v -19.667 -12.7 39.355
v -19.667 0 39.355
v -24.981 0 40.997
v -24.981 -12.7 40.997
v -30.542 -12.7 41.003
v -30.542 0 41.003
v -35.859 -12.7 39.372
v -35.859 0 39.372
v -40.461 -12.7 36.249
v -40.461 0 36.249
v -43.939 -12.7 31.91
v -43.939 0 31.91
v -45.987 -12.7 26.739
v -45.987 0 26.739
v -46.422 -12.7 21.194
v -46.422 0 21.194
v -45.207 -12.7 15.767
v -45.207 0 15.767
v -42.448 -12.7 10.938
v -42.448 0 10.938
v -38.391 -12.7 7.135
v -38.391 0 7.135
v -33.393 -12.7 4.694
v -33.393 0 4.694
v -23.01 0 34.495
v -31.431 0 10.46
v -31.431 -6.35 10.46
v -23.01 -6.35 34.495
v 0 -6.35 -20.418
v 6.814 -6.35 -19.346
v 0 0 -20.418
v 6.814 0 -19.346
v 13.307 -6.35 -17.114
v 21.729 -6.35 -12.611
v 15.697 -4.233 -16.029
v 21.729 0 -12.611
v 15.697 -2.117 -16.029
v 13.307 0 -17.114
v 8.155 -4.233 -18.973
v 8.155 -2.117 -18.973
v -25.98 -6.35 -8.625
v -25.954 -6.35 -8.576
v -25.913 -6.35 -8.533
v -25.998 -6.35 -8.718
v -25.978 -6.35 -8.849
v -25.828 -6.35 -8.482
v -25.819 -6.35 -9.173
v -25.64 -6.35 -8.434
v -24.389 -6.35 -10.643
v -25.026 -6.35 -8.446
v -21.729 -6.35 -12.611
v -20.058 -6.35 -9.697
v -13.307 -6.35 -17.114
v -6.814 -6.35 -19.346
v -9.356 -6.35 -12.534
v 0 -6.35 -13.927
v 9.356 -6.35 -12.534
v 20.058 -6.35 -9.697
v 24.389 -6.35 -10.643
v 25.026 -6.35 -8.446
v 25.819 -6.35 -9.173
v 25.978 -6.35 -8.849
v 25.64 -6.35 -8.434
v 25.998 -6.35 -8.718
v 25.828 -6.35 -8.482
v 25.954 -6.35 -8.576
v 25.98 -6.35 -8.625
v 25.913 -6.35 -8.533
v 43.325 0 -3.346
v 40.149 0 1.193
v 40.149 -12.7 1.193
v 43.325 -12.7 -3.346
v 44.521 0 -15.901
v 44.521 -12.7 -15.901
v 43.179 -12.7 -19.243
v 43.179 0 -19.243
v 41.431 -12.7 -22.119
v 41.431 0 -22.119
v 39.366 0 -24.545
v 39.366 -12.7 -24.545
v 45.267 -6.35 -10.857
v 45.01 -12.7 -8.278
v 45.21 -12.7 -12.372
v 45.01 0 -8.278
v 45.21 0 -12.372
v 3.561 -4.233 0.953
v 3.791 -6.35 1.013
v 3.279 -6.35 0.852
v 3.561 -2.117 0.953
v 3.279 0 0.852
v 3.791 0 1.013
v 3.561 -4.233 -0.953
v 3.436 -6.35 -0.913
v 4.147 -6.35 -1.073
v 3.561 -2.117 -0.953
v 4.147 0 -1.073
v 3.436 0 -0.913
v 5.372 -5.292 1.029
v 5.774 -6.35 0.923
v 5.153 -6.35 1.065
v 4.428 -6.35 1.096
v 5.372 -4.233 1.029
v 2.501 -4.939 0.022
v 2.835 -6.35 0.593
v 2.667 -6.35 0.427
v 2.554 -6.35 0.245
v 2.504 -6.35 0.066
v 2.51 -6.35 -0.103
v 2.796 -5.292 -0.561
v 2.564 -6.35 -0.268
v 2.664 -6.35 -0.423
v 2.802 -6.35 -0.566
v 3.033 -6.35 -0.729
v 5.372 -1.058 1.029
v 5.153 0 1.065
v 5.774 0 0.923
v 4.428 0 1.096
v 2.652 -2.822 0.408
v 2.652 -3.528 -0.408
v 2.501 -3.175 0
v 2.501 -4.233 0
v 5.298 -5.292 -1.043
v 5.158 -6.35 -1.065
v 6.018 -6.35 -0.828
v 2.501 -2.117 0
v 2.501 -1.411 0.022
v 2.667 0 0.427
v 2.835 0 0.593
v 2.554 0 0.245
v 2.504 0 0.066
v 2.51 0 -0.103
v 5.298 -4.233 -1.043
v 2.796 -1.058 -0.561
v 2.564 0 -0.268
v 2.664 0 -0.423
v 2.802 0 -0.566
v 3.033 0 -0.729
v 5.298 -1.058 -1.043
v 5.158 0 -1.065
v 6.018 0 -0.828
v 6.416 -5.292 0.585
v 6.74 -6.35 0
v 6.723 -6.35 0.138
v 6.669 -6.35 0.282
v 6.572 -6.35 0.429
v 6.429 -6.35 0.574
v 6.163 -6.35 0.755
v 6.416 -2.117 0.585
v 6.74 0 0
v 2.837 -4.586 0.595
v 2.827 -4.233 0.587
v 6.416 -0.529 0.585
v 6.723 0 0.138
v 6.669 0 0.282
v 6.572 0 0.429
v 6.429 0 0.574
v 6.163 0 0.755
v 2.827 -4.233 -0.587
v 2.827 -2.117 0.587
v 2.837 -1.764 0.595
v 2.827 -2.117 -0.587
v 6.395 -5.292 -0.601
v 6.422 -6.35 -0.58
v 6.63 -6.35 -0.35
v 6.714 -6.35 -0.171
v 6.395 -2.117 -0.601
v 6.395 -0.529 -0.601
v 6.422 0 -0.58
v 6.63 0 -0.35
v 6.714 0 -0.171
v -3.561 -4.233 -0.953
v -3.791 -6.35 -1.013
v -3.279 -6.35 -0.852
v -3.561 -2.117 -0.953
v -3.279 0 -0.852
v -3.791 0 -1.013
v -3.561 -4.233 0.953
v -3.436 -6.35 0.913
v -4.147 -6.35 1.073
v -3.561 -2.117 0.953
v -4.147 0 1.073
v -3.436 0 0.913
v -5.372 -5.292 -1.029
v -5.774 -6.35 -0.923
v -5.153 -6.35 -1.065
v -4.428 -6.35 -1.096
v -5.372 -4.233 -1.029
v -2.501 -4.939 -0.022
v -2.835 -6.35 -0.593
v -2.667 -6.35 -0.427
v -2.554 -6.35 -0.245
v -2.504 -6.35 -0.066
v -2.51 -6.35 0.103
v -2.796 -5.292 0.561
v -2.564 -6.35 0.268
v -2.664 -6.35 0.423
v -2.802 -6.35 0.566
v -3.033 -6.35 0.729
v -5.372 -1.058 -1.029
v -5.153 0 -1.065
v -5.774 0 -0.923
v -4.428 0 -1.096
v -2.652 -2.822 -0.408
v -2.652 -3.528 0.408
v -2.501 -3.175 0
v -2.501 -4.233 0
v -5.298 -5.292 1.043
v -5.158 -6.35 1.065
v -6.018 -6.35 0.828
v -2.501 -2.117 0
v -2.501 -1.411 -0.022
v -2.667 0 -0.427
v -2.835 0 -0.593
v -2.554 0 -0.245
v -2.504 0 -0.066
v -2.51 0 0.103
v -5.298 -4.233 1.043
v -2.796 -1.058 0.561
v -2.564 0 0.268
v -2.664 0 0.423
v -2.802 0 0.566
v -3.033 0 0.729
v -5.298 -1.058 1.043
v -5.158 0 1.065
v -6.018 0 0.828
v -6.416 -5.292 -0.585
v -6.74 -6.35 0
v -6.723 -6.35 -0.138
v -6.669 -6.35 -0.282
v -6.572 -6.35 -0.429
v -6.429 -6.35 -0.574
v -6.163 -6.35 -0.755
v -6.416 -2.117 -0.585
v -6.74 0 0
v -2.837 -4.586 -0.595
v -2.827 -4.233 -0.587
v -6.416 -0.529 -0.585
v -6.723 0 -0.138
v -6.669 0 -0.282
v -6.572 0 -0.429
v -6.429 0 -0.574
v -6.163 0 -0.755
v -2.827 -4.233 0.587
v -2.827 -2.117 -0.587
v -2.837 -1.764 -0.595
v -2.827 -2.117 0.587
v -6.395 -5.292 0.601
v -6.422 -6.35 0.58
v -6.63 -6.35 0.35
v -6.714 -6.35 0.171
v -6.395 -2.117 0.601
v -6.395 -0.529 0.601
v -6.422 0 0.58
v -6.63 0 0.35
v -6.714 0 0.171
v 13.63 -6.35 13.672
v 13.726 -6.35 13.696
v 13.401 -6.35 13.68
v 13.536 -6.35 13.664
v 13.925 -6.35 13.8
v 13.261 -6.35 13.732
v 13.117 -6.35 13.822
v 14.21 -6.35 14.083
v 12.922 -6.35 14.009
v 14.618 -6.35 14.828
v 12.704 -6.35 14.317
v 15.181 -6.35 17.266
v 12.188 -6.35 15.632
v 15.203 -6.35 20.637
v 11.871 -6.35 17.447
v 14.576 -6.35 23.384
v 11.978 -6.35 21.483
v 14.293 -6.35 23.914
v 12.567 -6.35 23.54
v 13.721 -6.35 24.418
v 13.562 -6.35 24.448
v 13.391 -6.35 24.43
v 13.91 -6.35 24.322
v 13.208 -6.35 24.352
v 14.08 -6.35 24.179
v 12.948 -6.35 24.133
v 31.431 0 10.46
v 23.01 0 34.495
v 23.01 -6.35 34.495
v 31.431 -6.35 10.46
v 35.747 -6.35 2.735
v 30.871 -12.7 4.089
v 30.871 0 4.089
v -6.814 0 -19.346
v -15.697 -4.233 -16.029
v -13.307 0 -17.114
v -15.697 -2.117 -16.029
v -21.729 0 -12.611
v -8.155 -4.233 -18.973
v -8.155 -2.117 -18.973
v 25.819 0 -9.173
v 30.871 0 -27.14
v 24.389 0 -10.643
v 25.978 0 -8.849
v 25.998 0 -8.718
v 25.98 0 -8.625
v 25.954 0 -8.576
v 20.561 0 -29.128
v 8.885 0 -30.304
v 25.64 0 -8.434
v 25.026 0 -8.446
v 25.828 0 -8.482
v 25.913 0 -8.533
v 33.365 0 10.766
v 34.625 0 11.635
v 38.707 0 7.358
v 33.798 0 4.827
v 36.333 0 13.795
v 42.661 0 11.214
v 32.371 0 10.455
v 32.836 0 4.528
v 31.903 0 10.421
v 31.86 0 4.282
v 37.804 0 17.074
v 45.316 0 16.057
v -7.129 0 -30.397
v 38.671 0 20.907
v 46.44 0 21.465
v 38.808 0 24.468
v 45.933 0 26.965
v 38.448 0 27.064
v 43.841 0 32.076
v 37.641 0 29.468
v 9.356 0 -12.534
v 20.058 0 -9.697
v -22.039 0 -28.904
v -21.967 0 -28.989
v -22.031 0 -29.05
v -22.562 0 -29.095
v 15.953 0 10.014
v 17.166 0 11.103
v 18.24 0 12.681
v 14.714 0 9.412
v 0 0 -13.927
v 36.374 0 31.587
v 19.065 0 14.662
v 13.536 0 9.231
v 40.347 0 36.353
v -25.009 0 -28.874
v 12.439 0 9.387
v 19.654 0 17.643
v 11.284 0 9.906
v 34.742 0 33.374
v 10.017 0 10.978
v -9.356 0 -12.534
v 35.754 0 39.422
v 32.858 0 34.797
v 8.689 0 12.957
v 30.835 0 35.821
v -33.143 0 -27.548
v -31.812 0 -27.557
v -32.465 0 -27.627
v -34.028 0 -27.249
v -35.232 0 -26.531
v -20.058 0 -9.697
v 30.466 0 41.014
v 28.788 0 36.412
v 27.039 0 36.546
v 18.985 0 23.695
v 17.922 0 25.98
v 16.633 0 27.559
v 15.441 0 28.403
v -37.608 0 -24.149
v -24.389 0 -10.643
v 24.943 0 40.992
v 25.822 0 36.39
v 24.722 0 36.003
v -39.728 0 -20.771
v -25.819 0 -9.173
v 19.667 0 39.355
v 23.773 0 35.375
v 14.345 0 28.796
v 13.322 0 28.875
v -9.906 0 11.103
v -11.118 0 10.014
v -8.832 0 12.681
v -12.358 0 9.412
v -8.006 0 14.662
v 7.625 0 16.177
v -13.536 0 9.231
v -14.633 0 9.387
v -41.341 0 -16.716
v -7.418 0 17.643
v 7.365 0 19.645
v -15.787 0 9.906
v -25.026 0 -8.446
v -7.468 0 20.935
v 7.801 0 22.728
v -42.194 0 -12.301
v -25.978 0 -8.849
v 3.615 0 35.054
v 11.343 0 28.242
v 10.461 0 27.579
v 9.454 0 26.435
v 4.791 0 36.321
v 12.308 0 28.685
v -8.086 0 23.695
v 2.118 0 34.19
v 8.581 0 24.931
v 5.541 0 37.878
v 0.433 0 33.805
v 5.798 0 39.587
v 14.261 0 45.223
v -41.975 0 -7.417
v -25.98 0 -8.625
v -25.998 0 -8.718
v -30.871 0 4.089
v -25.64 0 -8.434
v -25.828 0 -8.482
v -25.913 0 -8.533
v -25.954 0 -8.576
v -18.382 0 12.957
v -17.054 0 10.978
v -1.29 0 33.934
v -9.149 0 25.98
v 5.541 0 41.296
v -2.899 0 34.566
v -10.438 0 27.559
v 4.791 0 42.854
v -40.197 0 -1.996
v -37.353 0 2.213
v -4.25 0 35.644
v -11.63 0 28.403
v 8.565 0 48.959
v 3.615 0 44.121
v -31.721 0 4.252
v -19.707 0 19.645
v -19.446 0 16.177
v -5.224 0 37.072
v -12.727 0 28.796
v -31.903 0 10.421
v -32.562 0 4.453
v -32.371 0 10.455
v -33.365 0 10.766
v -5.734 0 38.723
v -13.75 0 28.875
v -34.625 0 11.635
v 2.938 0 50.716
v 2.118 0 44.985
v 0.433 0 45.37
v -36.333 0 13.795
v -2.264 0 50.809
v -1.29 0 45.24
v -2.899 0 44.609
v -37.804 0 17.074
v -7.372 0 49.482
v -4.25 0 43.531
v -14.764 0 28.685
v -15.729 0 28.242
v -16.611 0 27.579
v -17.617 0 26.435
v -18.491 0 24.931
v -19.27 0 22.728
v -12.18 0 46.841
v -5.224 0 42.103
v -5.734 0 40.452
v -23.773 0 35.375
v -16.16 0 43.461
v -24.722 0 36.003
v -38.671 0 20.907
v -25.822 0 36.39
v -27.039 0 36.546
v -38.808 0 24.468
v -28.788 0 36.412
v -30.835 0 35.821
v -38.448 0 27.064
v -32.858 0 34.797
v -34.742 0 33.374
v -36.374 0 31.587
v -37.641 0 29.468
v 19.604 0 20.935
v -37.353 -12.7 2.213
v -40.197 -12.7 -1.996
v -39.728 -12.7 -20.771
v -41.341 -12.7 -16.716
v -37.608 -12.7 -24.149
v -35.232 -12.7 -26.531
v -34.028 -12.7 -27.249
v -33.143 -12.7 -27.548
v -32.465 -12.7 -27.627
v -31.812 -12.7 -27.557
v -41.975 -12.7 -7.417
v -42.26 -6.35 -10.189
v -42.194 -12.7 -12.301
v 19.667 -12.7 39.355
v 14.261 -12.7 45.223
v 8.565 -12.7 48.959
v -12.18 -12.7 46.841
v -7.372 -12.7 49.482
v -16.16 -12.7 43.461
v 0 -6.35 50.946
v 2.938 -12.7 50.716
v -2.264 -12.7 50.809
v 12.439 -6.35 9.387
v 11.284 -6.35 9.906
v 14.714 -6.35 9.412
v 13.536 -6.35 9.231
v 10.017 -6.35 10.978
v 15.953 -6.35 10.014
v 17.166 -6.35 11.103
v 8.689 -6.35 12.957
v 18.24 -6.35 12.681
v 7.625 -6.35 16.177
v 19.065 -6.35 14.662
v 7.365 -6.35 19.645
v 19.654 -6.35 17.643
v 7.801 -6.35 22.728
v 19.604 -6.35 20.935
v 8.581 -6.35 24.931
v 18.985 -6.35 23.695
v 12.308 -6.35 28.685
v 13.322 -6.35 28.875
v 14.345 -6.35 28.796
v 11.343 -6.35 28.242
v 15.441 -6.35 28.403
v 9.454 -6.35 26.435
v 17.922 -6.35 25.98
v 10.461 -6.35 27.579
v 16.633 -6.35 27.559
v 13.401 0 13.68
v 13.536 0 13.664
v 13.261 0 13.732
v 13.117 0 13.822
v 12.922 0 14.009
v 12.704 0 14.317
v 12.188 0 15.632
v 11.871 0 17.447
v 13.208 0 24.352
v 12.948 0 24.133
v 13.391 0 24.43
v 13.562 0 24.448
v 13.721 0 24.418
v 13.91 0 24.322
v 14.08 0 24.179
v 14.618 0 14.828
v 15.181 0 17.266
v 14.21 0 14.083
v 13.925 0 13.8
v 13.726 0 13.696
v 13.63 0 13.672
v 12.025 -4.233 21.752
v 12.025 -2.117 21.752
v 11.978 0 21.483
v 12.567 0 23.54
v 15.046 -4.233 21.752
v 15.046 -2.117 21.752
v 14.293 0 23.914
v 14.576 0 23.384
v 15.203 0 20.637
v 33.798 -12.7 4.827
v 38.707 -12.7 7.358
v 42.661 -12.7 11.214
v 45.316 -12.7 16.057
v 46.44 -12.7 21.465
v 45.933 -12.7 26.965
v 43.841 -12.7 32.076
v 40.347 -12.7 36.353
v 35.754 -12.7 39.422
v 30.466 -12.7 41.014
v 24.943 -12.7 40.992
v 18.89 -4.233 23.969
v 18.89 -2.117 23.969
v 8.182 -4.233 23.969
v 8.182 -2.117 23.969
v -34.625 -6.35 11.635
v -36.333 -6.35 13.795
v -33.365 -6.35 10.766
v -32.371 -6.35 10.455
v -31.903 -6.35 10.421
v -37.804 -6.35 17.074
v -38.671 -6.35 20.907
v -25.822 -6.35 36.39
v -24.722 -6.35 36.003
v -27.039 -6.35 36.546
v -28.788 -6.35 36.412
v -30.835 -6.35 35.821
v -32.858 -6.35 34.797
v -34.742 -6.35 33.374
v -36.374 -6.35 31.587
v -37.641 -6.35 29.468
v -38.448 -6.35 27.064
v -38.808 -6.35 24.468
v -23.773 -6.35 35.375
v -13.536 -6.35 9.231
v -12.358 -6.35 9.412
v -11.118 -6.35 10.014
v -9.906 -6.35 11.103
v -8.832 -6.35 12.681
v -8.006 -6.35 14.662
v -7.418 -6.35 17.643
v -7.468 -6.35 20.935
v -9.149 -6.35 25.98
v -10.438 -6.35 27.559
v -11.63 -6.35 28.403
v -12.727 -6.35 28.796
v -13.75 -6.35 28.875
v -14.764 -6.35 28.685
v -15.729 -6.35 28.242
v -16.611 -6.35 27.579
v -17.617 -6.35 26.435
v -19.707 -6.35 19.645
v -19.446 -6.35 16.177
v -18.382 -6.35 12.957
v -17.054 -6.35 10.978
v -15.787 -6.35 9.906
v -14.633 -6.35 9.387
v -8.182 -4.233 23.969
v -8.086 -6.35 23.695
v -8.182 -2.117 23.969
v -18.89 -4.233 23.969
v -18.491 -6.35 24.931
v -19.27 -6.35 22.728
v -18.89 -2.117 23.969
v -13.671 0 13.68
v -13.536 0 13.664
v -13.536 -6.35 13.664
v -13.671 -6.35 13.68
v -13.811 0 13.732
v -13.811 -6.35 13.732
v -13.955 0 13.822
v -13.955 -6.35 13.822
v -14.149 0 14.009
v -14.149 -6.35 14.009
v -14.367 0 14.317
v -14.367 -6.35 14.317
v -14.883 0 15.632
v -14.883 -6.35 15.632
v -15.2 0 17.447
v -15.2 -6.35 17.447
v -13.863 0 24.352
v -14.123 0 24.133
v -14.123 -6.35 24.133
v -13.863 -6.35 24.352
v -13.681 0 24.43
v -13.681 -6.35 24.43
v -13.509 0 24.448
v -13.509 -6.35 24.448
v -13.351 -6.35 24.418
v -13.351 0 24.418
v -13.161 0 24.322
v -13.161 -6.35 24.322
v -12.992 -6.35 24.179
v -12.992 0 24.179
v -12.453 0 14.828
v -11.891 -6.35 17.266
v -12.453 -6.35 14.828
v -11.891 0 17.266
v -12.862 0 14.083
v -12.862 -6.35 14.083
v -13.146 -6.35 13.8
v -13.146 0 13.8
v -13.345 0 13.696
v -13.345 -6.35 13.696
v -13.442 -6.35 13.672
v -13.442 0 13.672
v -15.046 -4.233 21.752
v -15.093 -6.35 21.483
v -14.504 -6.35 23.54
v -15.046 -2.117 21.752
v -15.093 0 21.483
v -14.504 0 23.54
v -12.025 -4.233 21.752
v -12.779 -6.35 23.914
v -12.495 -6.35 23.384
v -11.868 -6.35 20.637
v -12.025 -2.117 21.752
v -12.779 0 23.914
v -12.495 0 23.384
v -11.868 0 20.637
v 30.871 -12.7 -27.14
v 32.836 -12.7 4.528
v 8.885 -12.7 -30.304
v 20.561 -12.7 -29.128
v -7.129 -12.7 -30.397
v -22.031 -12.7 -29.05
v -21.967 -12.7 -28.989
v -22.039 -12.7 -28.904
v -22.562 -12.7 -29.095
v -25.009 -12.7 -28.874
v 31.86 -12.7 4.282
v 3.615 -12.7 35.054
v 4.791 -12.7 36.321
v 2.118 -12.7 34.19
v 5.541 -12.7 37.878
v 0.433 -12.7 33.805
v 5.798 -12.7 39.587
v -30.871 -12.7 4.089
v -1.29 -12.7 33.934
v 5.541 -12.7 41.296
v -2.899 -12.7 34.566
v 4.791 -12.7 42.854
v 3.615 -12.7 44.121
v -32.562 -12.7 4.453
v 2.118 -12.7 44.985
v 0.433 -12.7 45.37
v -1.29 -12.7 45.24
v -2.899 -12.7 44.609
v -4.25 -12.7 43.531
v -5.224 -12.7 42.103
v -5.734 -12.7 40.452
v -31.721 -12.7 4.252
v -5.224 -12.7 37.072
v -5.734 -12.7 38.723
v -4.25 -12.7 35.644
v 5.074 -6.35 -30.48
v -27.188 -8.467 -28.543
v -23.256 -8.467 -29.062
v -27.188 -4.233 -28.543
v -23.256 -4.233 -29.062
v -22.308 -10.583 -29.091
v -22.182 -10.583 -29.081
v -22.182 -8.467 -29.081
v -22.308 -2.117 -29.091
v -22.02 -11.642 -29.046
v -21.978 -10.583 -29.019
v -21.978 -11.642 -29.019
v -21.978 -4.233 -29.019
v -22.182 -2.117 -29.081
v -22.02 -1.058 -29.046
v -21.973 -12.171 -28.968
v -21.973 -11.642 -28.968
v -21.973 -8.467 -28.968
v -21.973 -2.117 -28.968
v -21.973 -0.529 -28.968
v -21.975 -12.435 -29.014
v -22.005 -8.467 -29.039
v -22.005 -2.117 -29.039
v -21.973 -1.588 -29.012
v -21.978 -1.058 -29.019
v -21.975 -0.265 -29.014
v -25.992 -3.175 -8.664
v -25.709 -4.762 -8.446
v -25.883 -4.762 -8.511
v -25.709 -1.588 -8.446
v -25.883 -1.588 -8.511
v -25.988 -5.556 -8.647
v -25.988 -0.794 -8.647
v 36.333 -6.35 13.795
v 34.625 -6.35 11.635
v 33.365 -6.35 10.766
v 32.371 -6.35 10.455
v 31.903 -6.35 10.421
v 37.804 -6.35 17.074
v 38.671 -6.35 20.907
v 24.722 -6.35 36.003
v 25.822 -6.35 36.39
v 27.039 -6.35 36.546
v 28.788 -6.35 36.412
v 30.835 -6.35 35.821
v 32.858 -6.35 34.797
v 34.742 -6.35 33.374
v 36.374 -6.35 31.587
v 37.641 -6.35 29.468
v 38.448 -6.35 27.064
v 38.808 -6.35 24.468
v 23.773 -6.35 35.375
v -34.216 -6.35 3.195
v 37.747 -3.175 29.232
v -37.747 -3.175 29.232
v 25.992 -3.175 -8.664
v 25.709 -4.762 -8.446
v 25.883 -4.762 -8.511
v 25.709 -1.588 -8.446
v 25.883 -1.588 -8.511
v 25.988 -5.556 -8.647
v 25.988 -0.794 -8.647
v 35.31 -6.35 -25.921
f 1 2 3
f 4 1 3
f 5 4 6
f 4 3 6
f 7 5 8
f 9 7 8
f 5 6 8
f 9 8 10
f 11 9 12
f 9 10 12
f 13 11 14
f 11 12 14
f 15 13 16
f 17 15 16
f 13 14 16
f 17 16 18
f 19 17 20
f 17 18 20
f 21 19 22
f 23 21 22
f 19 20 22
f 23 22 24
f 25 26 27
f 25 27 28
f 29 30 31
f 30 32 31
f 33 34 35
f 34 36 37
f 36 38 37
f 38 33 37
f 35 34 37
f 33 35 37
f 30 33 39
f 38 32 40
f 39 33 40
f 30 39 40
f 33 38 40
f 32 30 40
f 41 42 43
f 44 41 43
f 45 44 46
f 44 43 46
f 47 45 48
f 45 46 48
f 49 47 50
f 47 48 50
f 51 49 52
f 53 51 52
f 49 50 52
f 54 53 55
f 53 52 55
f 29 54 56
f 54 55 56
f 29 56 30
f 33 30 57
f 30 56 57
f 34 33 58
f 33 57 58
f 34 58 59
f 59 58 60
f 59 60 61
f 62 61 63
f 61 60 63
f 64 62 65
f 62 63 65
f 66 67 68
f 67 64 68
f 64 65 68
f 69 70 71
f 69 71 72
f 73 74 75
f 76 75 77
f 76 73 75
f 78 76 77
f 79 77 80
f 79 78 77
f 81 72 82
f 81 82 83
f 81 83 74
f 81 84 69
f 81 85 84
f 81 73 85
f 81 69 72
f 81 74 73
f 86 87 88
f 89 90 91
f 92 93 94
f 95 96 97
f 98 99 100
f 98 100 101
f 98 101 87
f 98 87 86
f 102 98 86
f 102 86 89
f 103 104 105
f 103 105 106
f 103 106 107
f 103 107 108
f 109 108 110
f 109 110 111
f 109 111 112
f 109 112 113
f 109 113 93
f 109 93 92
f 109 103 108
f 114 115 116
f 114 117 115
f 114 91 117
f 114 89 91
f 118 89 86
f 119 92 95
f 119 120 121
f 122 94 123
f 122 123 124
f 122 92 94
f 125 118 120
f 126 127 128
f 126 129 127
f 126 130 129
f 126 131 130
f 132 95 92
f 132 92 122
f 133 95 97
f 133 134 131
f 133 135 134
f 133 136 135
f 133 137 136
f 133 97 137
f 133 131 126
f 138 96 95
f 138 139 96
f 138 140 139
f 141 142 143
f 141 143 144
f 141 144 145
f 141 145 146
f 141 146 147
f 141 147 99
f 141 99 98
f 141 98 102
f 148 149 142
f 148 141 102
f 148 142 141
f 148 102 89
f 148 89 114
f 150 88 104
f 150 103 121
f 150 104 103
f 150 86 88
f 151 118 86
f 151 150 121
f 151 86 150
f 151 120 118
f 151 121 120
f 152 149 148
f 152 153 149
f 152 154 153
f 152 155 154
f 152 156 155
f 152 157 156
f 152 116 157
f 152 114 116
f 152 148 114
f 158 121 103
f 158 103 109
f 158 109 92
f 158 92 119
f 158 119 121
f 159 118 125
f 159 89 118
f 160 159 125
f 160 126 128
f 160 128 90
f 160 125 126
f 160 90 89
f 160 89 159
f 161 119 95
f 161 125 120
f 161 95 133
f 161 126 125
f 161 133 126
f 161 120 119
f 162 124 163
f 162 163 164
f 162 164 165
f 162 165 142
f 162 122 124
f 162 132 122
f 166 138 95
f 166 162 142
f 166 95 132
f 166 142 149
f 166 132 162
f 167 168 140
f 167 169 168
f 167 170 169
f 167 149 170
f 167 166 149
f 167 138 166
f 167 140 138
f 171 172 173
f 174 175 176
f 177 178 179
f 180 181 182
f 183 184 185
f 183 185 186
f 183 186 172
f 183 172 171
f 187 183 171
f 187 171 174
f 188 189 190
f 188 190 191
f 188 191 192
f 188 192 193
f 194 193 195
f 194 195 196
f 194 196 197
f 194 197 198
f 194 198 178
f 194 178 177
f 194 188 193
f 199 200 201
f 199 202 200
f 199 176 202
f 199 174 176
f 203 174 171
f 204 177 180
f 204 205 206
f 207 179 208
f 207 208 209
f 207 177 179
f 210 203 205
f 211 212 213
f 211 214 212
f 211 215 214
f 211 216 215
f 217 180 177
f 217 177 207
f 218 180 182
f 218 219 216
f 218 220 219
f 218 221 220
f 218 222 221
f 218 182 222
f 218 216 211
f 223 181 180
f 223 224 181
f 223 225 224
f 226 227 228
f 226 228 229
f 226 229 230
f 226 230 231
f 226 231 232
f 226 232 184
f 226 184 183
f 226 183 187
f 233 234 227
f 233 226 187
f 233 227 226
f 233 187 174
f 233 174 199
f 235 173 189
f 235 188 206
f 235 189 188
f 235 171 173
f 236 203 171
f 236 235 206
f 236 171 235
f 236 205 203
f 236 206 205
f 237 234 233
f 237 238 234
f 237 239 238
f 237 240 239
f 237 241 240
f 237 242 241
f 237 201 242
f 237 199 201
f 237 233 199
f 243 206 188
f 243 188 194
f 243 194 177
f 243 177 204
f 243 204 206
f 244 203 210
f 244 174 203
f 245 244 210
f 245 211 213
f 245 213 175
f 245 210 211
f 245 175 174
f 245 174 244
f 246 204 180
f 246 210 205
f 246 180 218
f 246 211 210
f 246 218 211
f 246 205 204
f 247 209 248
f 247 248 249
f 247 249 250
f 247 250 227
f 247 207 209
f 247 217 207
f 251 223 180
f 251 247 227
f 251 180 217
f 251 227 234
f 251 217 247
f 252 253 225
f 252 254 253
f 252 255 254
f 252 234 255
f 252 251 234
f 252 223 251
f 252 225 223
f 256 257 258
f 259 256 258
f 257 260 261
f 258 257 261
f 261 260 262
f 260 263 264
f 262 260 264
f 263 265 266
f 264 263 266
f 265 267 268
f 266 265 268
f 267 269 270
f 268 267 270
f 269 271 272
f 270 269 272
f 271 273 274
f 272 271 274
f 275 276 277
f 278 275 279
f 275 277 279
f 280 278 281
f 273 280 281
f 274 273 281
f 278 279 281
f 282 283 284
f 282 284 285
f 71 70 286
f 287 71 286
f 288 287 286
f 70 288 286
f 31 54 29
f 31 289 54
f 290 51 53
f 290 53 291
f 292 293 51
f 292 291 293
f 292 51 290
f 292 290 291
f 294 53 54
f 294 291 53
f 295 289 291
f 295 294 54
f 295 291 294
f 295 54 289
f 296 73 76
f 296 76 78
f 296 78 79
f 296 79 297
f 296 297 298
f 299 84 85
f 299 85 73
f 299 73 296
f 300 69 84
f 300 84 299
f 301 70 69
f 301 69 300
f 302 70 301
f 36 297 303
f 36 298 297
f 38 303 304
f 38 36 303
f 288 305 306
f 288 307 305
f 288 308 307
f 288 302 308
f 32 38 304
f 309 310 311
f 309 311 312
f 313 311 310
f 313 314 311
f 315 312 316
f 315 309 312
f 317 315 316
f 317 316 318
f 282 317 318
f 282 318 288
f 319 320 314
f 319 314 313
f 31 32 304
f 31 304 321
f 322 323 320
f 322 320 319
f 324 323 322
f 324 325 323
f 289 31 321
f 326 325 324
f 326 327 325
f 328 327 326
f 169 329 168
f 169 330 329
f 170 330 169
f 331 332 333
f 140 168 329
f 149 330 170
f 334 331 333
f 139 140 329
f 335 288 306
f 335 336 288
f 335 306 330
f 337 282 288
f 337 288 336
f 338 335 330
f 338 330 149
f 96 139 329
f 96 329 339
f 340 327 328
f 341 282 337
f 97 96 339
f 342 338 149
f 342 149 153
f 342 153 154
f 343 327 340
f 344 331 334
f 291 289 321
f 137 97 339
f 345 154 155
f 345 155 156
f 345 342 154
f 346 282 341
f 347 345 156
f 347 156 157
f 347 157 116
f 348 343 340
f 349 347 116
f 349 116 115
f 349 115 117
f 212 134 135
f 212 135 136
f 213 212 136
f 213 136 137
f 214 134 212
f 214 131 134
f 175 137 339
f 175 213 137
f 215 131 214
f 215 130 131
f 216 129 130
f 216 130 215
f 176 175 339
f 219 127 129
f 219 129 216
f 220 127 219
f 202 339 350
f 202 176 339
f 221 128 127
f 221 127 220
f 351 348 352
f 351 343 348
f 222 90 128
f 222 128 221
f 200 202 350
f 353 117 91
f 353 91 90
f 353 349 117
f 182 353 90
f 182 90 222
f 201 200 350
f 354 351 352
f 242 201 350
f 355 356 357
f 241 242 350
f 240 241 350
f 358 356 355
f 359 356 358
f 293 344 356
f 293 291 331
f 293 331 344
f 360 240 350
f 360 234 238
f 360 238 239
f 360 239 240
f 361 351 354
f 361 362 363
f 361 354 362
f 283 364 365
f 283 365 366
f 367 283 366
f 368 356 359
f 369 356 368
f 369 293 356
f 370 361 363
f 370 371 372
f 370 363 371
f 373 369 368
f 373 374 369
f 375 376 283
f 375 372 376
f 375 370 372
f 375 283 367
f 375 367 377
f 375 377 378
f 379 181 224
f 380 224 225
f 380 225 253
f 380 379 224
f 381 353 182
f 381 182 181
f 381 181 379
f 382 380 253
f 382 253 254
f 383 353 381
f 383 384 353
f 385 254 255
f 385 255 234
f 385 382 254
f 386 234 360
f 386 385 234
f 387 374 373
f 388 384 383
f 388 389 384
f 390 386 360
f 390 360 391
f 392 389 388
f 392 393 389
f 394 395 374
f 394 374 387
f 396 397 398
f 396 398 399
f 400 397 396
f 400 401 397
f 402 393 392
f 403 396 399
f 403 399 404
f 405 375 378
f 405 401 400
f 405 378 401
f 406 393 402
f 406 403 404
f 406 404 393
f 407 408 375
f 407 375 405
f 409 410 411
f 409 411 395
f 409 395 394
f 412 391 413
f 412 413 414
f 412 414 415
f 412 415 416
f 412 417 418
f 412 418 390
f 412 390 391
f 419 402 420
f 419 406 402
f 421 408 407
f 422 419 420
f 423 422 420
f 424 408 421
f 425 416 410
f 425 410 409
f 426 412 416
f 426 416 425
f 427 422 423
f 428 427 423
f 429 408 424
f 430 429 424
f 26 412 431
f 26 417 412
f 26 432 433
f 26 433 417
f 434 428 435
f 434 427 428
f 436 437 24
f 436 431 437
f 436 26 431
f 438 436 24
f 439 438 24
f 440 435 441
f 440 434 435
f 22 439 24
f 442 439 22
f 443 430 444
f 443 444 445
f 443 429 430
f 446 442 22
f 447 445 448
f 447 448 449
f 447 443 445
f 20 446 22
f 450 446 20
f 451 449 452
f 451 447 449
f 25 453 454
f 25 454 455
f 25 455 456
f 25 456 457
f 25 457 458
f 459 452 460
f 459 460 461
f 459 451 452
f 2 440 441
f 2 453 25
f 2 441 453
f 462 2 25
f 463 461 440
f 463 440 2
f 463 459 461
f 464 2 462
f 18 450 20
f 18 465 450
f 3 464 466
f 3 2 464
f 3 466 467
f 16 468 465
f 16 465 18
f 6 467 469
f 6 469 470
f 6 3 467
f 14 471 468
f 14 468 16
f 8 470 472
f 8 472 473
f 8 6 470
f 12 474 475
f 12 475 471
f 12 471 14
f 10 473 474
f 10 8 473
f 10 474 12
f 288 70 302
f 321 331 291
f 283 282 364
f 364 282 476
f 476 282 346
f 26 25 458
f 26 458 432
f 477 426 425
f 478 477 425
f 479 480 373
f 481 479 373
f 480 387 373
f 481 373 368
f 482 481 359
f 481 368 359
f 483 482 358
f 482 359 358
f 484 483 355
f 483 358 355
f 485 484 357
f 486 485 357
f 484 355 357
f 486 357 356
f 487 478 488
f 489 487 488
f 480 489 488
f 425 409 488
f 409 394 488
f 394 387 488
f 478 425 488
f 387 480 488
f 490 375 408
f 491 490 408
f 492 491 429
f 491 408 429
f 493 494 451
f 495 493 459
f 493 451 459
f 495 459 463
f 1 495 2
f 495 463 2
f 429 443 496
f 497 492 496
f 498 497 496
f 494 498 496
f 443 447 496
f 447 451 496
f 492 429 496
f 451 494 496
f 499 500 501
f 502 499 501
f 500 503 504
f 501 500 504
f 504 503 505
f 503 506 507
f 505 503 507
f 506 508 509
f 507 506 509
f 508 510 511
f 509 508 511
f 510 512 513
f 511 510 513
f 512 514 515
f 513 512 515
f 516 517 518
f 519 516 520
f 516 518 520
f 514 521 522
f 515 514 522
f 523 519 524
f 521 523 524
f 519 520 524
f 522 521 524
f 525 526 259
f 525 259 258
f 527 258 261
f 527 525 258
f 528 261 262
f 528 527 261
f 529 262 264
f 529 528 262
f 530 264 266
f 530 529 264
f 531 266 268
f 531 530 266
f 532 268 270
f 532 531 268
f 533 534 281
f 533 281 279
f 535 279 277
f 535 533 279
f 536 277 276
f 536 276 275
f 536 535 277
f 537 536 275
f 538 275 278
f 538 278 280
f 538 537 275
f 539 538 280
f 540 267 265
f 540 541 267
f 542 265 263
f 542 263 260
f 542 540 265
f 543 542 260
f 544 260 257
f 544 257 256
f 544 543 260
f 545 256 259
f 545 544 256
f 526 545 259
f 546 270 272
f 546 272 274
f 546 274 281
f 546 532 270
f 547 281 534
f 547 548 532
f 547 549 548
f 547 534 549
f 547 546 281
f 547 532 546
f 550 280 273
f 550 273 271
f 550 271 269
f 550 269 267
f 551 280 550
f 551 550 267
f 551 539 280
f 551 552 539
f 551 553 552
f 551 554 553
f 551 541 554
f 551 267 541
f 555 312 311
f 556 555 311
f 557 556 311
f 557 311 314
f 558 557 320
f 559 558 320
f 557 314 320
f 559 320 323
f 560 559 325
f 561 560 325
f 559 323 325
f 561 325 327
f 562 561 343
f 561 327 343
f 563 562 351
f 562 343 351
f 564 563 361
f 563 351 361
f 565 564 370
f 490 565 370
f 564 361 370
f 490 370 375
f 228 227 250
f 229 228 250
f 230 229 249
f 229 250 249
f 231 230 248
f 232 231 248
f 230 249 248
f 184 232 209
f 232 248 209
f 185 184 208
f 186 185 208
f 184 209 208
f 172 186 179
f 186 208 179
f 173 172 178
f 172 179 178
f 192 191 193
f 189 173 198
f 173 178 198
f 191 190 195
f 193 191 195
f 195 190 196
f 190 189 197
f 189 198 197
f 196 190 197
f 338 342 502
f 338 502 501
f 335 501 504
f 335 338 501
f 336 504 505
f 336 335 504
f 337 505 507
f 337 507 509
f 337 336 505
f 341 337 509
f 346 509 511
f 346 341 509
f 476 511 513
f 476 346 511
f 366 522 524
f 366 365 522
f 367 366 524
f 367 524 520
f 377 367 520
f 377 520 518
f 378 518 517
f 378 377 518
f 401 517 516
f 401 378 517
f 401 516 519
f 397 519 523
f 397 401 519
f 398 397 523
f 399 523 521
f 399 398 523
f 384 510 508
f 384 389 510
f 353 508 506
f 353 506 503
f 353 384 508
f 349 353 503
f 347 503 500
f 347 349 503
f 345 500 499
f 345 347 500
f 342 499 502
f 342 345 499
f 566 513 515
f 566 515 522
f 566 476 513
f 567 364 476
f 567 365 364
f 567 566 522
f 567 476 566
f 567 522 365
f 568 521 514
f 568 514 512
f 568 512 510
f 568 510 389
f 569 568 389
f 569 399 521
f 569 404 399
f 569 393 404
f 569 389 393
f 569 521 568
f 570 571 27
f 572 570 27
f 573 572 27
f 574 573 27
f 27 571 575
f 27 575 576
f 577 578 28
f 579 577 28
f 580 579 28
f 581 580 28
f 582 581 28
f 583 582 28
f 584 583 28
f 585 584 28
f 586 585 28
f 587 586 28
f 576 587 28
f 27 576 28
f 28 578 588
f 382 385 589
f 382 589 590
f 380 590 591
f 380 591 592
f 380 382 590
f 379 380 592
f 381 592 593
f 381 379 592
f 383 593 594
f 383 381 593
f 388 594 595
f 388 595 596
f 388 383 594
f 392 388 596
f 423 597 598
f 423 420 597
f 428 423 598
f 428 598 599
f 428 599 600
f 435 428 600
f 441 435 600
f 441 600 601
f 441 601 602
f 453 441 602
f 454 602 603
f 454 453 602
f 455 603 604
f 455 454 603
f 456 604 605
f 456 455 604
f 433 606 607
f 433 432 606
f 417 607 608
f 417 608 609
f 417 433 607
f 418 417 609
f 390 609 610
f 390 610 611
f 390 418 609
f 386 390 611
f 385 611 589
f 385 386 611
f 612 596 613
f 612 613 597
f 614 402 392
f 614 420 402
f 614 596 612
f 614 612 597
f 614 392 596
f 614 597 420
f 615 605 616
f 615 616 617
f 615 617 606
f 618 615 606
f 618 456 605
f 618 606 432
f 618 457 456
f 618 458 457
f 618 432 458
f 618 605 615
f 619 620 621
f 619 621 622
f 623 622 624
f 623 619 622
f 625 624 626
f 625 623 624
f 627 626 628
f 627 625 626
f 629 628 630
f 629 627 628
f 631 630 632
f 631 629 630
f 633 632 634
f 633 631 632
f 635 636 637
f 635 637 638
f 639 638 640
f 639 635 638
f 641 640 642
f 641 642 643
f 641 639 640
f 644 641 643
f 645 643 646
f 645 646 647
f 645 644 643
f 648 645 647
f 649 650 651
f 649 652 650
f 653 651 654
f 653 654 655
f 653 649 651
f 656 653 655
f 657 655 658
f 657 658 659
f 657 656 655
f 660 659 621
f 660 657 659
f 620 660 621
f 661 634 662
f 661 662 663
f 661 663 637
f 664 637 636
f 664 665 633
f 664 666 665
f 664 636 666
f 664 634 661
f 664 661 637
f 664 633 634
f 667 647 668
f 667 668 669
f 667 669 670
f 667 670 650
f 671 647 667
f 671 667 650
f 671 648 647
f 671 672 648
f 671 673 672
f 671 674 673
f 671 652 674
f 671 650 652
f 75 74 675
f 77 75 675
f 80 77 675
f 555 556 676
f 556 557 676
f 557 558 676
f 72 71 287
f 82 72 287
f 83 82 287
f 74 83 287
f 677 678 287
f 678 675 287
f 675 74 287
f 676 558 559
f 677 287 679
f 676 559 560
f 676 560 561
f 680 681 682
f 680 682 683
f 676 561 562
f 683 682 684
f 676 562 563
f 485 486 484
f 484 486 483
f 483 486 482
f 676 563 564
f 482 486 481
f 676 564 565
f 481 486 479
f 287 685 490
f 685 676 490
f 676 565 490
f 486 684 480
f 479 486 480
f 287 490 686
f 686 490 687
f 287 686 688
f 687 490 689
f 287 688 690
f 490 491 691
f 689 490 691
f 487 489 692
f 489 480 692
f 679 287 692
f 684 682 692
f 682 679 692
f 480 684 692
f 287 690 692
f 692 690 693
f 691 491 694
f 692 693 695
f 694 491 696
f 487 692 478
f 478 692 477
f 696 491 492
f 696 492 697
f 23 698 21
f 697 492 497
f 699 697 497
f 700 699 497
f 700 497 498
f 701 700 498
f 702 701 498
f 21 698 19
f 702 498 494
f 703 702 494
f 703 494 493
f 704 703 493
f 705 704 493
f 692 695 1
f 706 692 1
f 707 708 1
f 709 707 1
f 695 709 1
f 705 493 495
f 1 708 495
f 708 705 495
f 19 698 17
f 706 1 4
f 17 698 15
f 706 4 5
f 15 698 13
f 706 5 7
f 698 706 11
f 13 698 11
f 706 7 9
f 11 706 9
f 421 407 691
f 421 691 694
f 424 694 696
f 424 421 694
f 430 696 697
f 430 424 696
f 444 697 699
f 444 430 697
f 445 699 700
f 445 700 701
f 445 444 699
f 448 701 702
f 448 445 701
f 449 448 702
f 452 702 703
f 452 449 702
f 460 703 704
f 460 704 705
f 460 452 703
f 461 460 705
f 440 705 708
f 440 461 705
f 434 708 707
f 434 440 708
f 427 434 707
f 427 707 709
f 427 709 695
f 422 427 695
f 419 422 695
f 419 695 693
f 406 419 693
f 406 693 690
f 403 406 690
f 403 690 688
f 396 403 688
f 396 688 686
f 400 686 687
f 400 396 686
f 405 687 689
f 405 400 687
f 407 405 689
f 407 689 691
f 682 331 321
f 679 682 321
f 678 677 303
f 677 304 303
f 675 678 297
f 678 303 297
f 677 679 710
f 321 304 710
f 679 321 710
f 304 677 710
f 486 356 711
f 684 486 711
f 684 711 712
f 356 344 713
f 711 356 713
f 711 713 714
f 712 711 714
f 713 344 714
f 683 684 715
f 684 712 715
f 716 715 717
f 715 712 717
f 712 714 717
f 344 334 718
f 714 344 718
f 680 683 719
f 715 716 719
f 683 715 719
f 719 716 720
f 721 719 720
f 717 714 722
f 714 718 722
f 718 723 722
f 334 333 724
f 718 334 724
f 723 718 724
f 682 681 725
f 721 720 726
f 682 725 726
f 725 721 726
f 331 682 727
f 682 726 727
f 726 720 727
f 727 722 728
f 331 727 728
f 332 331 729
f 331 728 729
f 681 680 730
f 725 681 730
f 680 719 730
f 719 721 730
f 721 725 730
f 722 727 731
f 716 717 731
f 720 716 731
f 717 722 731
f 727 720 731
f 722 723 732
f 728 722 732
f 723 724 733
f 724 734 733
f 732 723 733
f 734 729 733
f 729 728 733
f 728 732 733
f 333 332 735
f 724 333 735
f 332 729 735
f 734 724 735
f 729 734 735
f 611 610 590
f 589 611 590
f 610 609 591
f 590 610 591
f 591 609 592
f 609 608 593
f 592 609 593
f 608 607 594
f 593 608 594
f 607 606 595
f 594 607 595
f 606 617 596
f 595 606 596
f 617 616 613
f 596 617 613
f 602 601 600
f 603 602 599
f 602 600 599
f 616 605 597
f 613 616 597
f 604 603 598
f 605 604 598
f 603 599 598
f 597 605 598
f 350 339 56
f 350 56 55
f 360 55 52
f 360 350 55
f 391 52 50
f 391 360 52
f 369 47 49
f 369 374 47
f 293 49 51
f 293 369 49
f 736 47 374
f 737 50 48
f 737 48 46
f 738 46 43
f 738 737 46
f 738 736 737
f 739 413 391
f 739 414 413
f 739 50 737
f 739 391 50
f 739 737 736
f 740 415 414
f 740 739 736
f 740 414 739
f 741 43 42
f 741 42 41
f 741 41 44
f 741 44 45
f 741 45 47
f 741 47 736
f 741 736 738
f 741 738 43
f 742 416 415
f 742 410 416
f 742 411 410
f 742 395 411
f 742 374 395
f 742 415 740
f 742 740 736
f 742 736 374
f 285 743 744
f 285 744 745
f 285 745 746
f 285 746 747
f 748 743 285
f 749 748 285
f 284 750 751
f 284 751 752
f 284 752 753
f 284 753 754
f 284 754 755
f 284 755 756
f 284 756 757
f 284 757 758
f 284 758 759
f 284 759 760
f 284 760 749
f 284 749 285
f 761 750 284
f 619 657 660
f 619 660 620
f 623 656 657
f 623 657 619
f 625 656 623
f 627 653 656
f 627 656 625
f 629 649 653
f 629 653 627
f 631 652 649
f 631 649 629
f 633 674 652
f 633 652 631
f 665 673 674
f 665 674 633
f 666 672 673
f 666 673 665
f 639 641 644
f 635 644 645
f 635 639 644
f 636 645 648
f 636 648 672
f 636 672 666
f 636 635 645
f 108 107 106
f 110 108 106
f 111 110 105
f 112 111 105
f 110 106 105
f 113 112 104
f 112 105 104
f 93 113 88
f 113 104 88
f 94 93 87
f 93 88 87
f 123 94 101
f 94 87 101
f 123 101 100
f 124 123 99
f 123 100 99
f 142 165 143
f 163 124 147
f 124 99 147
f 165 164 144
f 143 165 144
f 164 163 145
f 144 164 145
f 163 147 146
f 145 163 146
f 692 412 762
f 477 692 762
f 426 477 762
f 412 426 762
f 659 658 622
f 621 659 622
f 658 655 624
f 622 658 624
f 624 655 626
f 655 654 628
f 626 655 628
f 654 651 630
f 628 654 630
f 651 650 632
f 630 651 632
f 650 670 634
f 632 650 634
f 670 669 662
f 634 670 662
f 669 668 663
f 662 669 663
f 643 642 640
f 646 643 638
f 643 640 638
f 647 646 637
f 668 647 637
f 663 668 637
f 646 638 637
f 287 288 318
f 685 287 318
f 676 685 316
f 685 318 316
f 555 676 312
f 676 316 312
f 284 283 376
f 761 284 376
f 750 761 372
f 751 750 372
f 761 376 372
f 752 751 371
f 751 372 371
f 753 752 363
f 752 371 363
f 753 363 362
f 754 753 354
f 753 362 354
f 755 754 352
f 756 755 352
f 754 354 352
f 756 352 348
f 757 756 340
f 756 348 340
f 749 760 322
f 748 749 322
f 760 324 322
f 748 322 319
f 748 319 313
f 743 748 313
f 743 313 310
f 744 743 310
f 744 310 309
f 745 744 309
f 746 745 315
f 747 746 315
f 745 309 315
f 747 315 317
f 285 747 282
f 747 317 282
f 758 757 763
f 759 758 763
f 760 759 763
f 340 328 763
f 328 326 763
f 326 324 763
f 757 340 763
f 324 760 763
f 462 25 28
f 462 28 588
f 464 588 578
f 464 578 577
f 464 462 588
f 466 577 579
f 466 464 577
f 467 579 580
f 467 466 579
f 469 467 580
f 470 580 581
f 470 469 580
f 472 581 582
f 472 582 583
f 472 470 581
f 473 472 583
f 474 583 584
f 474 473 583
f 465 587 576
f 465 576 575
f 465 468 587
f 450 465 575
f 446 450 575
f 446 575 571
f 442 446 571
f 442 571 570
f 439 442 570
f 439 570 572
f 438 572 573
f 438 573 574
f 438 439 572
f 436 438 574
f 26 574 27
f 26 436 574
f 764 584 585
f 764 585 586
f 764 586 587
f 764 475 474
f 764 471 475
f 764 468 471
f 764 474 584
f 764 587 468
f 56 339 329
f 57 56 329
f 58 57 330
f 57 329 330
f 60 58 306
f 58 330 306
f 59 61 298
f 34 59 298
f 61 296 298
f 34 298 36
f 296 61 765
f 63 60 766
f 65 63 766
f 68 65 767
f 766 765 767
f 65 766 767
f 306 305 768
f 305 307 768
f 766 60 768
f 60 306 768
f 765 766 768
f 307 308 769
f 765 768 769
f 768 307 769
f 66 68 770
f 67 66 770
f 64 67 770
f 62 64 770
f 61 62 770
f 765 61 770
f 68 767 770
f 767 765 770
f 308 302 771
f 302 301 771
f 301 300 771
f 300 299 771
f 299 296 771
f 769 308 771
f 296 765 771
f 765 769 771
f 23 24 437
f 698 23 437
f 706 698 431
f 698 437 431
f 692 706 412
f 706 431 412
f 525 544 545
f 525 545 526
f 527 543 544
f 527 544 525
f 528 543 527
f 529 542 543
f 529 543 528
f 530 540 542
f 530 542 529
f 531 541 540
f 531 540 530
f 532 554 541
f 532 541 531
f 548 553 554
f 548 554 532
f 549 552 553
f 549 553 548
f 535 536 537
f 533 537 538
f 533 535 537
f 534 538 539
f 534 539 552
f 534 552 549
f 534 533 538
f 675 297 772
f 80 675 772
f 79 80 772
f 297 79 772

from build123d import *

# Parameters (mm, degrees)
F1_DEPTH = 12.7
F3_DEPTH = 6.35
F5_DEPTH = 6.35
F6_R     = 5.7983245301
F7_DEPTH = 12.7


# Not quite as in the source:
# - a feature names something its author has since deleted; it is built from what else it names


with BuildPart() as f1:
    # F0 (on Front) → F1 (new body)
    with BuildSketch(Plane.XZ):
        with BuildLine():
            add(Edge.make_bspline(
                [(40.1493628068, 1.1925501326), (42.9902625136, -1.8060247086), (47.7076151577, -11.3530425376), (42.6565450289, -21.2863101438), (39.3658101892, -24.5448989348)],
                knots=[0.1578760235, 0.1578760235, 0.1578760235, 0.1578760235, 0.3076794717, 0.476894104, 0.476894104, 0.476894104, 0.476894104], degree=3))
            add(Edge.make_bspline(
                [(40.1493628068, 1.1925501326), (35.9845138771, 2.8298261079), (30.8712290795, 4.0887432654)],
                knots=[0.7315172092, 0.7315172092, 0.7315172092, 0.9616188361, 0.9616188361, 0.9616188361], degree=2, weights=[1, 0.9933889524, 1]))
            add(Edge.make_bspline(
                [(30.8712290795, -27.1396419515), (24.7144737369, -23.1861092597), (24.6668360543, -0.155679542), (30.8712290795, 4.0887432654)],
                knots=[0.6225566131, 0.6225566131, 0.6225566131, 0.6225566131, 1, 1, 1, 1], degree=3))
            add(Edge.make_bspline(
                [(30.8712290795, -27.1396419515), (35.5034035213, -25.9991766513), (39.3658101892, -24.5448989348)],
                knots=[5.3215664711, 5.3215664711, 5.3215664711, 5.530182505, 5.530182505, 5.530182505], degree=2, weights=[1, 0.9945648494, 1]))
        make_face()
        with BuildLine():
            add(Edge.make_bspline(
                [(30.8712290795, -27.1396419515), (24.7144737369, -23.1861092597), (24.6668360543, -0.155679542), (30.8712290795, 4.0887432654)],
                knots=[0.6225566131, 0.6225566131, 0.6225566131, 0.6225566131, 1, 1, 1, 1], degree=3))
            add(Edge.make_bspline(
                [(30.8712290795, 4.0887432654), (0, 11.6893994973), (-30.8712290795, 4.0887432654)],
                knots=[0.9616188361, 0.9616188361, 0.9616188361, 2.1799738175, 2.1799738175, 2.1799738175], degree=2, weights=[1, 0.8201189293, 1]))
            add(Edge.make_bspline(
                [(-30.316427276, -26.6621504769), (-25.7197611969, -21.8642187355), (-25.8183679957, 0.1889268802), (-30.8712290795, 4.0887432654)],
                knots=[0.6258895591, 0.6258895591, 0.6258895591, 0.6258895591, 1, 1, 1, 1], degree=3))
            add(Edge.make_bspline(
                [(-22.0386772722, -28.9035404471), (-22.6123014836, -28.5018760595), (-26.7203664064, -27.4343086812), (-30.316427276, -26.6621504769)],
                knots=[0.351007364, 0.351007364, 0.351007364, 0.351007364, 0.5986156077, 0.5986156077, 0.5986156077, 0.5986156077], degree=3))
            add(Edge.make_bspline(
                [(-22.0386772722, -28.9035404471), (5.8306627498, -33.3047588645), (30.8712290795, -27.1396419515)],
                knots=[4.2915972789, 4.2915972789, 4.2915972789, 5.3215664711, 5.3215664711, 5.3215664711], degree=2, weights=[1, 0.8703003092, 1]))
        make_face()
        with BuildLine():
            add(Edge.make_bspline(
                [(30.8712290795, 4.0887432654), (0, 11.6893994973), (-30.8712290795, 4.0887432654)],
                knots=[0.9616188361, 0.9616188361, 0.9616188361, 2.1799738175, 2.1799738175, 2.1799738175], degree=2, weights=[1, 0.8201189293, 1]))
            add(Edge.make_bspline(
                [(30.8712290795, 4.0887432654), (29.8167825832, 25.6310168931), (19.6674686975, 39.3551867716)],
                knots=[1.651139429, 1.651139429, 1.651139429, 2.4535507775, 2.4535507775, 2.4535507775], degree=2, weights=[1, 0.920590813, 1]))
            add(Edge.make_bspline(
                [(19.6674686975, 39.3551867716), (0, 65.9500565848), (-19.6674686975, 39.3551867716)],
                knots=[2.4535507775, 2.4535507775, 2.4535507775, 3.8296345296, 3.8296345296, 3.8296345296], degree=2, weights=[1, 0.7724909543, 1]))
            add(Edge.make_bspline(
                [(-19.6674686975, 39.3551867716), (-29.8167825832, 25.6310168931), (-30.8712290795, 4.0887432654)],
                knots=[3.8296345296, 3.8296345296, 3.8296345296, 4.6320458782, 4.6320458782, 4.6320458782], degree=2, weights=[1, 0.920590813, 1]))
        make_face()
        with BuildLine():
            add(Edge.make_bspline(
                [(30.8712290795, 4.0887432654), (29.8167825832, 25.6310168931), (19.6674686975, 39.3551867716)],
                knots=[1.651139429, 1.651139429, 1.651139429, 2.4535507775, 2.4535507775, 2.4535507775], degree=2, weights=[1, 0.920590813, 1]))
            add(Edge.make_bspline(
                [(30.8712290795, 4.0887432654), (31.745474043, 4.6868138982), (32.7438524431, 4.9118902663), (33.7979767486, 4.8265914139)],
                knots=[0, 0, 0, 0, 0.0531845708, 0.0531845708, 0.0531845708, 0.0531845708], degree=3))
            ThreePointArc((33.7979767486, 4.8265914139), (45.0771172482, 29.5981627551), (19.6674686975, 39.3551867716))
        make_face()
        with BuildLine():
            add(Edge.make_bspline(
                [(30.8712290795, 4.0887432654), (31.745474043, 4.6868138982), (32.7438524431, 4.9118902663), (33.7979767486, 4.8265914139)],
                knots=[0, 0, 0, 0, 0.0531845708, 0.0531845708, 0.0531845708, 0.0531845708], degree=3))
            ThreePointArc((30.8712290795, 4.0887432654), (32.3495232988, 4.3984841575), (33.7979767486, 4.8265914139))
        make_face()
        with BuildLine():
            add(Edge.make_bspline(
                [(-30.316427276, -26.6621504769), (-25.7197611969, -21.8642187355), (-25.8183679957, 0.1889268802), (-30.8712290795, 4.0887432654)],
                knots=[0.6258895591, 0.6258895591, 0.6258895591, 0.6258895591, 1, 1, 1, 1], degree=3))
            add(Edge.make_bspline(
                [(-30.8712290795, 4.0887432654), (-34.319490328, 3.2397635154), (-37.3534035771, 2.2125195676)],
                knots=[2.1799738175, 2.1799738175, 2.1799738175, 2.335522065, 2.335522065, 2.335522065], degree=2, weights=[1, 0.996977117, 1]))
            add(Edge.make_bspline(
                [(-37.3534035771, 2.2125195676), (-39.9565279998, -0.5633337342), (-46.0541036061, -13.7787361602), (-36.0664526702, -28.5369114032), (-31.8118056749, -27.5574924828)],
                knots=[0.1353541067, 0.1353541067, 0.1353541067, 0.1353541067, 0.2971739822, 0.5889352074, 0.5889352074, 0.5889352074, 0.5889352074], degree=3))
            add(Edge.make_bspline(
                [(-30.316427276, -26.6621504769), (-32.7944749747, -26.1300557959), (-38.0519143989, -25.2083426228), (-34.6365631834, -26.8036586224), (-31.8118056749, -27.5574924828)],
                knots=[0.5986156077, 0.5986156077, 0.5986156077, 0.5986156077, 0.7692425968, 1, 1, 1, 1], degree=3))
        make_face()
        with BuildLine():
            add(Edge.make_bspline(
                [(-30.8712290795, 4.0887432654), (-31.6240605241, 4.6697812862), (-32.4868682621, 4.8478452679), (-33.3934643409, 4.6941488206)],
                knots=[0, 0, 0, 0, 0.0557391345, 0.0557391345, 0.0557391345, 0.0557391345], degree=3))
            add(Edge.make_bspline(
                [(-19.6674686975, 39.3551867716), (-29.8167825832, 25.6310168931), (-30.8712290795, 4.0887432654)],
                knots=[3.8296345296, 3.8296345296, 3.8296345296, 4.6320458782, 4.6320458782, 4.6320458782], degree=2, weights=[1, 0.920590813, 1]))
            ThreePointArc((-19.6674686975, 39.3551867716), (-45.1566020526, 29.4007381707), (-33.3934643409, 4.6941488206))
        make_face()
        with BuildLine():
            ThreePointArc((-33.3934643409, 4.6941488206), (-32.1428628623, 4.3476337433), (-30.8712290795, 4.0887432654))
            add(Edge.make_bspline(
                [(-30.8712290795, 4.0887432654), (-31.6240605241, 4.6697812862), (-32.4868682621, 4.8478452679), (-33.3934643409, 4.6941488206)],
                knots=[0, 0, 0, 0, 0.0557391345, 0.0557391345, 0.0557391345, 0.0557391345], degree=3))
        make_face()
        with BuildLine():
            add(Edge.make_bspline(
                [(-22.0386772722, -28.9035404471), (-22.6123014836, -28.5018760595), (-26.7203664064, -27.4343086812), (-30.316427276, -26.6621504769)],
                knots=[0.351007364, 0.351007364, 0.351007364, 0.351007364, 0.5986156077, 0.5986156077, 0.5986156077, 0.5986156077], degree=3))
            add(Edge.make_bspline(
                [(-31.8118056749, -27.5574924828), (-31.4840598446, -27.4820454557), (-30.9663386258, -27.2558139926), (-30.4943329872, -26.8478458143), (-30.316427276, -26.6621504769)],
                knots=[0.5889352074, 0.5889352074, 0.5889352074, 0.5889352074, 0.6114102859, 0.6258895591, 0.6258895591, 0.6258895591, 0.6258895591], degree=3))
            add(Edge.make_bspline(
                [(-31.8118056749, -27.5574924828), (-27.5150391443, -28.7041566093), (-21.2255124143, -29.4729365051), (-22.0386772722, -28.9035404471)],
                knots=[0, 0, 0, 0, 0.351007364, 0.351007364, 0.351007364, 0.351007364], degree=3))
        make_face()
        with BuildLine():
            add(Edge.make_bspline(
                [(-31.8118056749, -27.5574924828), (-31.4840598446, -27.4820454557), (-30.9663386258, -27.2558139926), (-30.4943329872, -26.8478458143), (-30.316427276, -26.6621504769)],
                knots=[0.5889352074, 0.5889352074, 0.5889352074, 0.5889352074, 0.6114102859, 0.6258895591, 0.6258895591, 0.6258895591, 0.6258895591], degree=3))
            add(Edge.make_bspline(
                [(-30.316427276, -26.6621504769), (-32.7944749747, -26.1300557959), (-38.0519143989, -25.2083426228), (-34.6365631834, -26.8036586224), (-31.8118056749, -27.5574924828)],
                knots=[0.5986156077, 0.5986156077, 0.5986156077, 0.5986156077, 0.7692425968, 1, 1, 1, 1], degree=3))
        make_face()
    extrude(amount=F1_DEPTH)

    # F2 (on Front) → F3 (cut)
    with BuildSketch(Plane.XZ):
        with BuildLine():
            Line((-31.4306877553, 10.459586978), (-23.0095088482, 34.4950370491))
            add(Edge.make_bspline(
                [(-23.0095088482, 34.4950370491), (-25.8661962885, 38.8630829165), (-45.0005379548, 32.5188186692), (-36.4615387565, 9.6457820973), (-31.4306877553, 10.459586978)],
                knots=[0, 0, 0, 0, 0.2940527748, 0.6248688178, 0.6248688178, 0.6248688178, 0.6248688178], degree=3))
        make_face()
        with BuildLine():
            add(Edge.make_bspline(
                [(-13.5356802493, 9.2314984649), (-2.8277460367, 9.2314984649), (-8.181713143, 23.9685634151), (-13.5356802493, 38.7056283653), (-18.8896473556, 23.9685634151), (-24.2436144619, 9.2314984649), (-13.5356802493, 9.2314984649)],
                knots=[0, 0, 0, 2.0943951024, 2.0943951024, 4.1887902048, 4.1887902048, 6.2831853072, 6.2831853072, 6.2831853072], degree=2, weights=[1, 0.5, 1, 0.5, 1, 0.5, 1]))
        make_face()
        with BuildLine():
            add(Edge.make_bspline(
                [(-21.7289508062, -12.611449449), (-21.7321865207, -12.5803032561), (-21.7163109163, -10.9862071439), (-11.1745113639, -14.6318470824), (0, -13.9267453924)],
                knots=[0.7618847301, 0.7618847301, 0.7618847301, 0.7618847301, 0.7662818157, 1, 1, 1, 1], degree=3))
            add(Edge.make_bspline(
                [(0, -13.9267453924), (-12.3324538091, -13.1485785679), (-30.5801397036, -4.9477572556), (-24.4648668208, -10.7903922273), (-21.7289508062, -12.611449449)],
                knots=[0, 0, 0, 0, 0.2579368903, 0.3528249437, 0.3528249437, 0.3528249437, 0.3528249437], degree=3))
        make_face()
        with BuildLine():
            add(Edge.make_bspline(
                [(0, -13.9267453924), (12.3324538091, -13.1485785679), (30.5801396984, -4.9477572579), (24.4648668243, -10.790392224), (21.7289508149, -12.6114494432)],
                knots=[0, 0, 0, 0, 0.2579368903, 0.3528249436, 0.3528249436, 0.3528249436, 0.3528249436], degree=3))
            add(Edge.make_bspline(
                [(21.7289508074, -12.6114494375), (21.7321865206, -12.5803032489), (21.7163108924, -10.9862071522), (11.1745113639, -14.6318470824), (0, -13.9267453924)],
                knots=[0.7618847306, 0.7618847306, 0.7618847306, 0.7618847306, 0.7662818157, 1, 1, 1, 1], degree=3))
        make_face()
        with BuildLine():
            add(Edge.make_bspline(
                [(21.7289508074, -12.6114494375), (21.7321865206, -12.5803032489), (21.7163108924, -10.9862071522), (11.1745113639, -14.6318470824), (0, -13.9267453924)],
                knots=[0.7618847306, 0.7618847306, 0.7618847306, 0.7618847306, 0.7662818157, 1, 1, 1, 1], degree=3))
            add(Edge.make_bspline(
                [(-21.7289508062, -12.611449449), (-21.7321865207, -12.5803032561), (-21.7163109163, -10.9862071439), (-11.1745113639, -14.6318470824), (0, -13.9267453924)],
                knots=[0.7618847301, 0.7618847301, 0.7618847301, 0.7618847301, 0.7662818157, 1, 1, 1, 1], degree=3))
            add(Edge.make_bspline(
                [(-21.7289508062, -12.611449449), (-16.7514821777, -15.9245099169), (-8.1619923275, -20.0642127089), (-3.62e-08, -20.4180739804)],
                knots=[0.3528249437, 0.3528249437, 0.3528249437, 0.3528249437, 0.5254553557, 0.5254553557, 0.5254553557, 0.5254553557], degree=3))
            add(Edge.make_bspline(
                [(21.7289508149, -12.6114494432), (16.7514821877, -15.9245099121), (8.1619922942, -20.064212727), (-3.62e-08, -20.4180739836)],
                knots=[0.3528249436, 0.3528249436, 0.3528249436, 0.3528249436, 0.5254553557, 0.5254553557, 0.5254553557, 0.5254553557], degree=3))
        make_face()
        with BuildLine():
            add(Edge.make_bspline(
                [(23.0095088482, 34.4950370491), (25.8661962885, 38.8630829165), (45.0005379548, 32.5188186692), (36.4615387565, 9.6457820973), (31.4306877553, 10.459586978)],
                knots=[0, 0, 0, 0, 0.2940527748, 0.6248688178, 0.6248688178, 0.6248688178, 0.6248688178], degree=3))
            Line((23.0095088482, 34.4950370491), (31.4306877553, 10.459586978))
        make_face()
        with BuildLine():
            add(Edge.make_bspline(
                [(13.5356802493, 9.2314984649), (24.2436144619, 9.2314984649), (18.8896473556, 23.9685634151), (13.5356802493, 38.7056283653), (8.181713143, 23.9685634151), (2.8277460367, 9.2314984649), (13.5356802493, 9.2314984649)],
                knots=[0, 0, 0, 2.0943951024, 2.0943951024, 4.1887902048, 4.1887902048, 6.2831853072, 6.2831853072, 6.2831853072], degree=2, weights=[1, 0.5, 1, 0.5, 1, 0.5, 1]))
        make_face()
        with BuildLine():
            add(Edge.make_bspline(
                [(-6.7399754189, 0), (-6.7399754189, -1.9063044273), (-3.5605162848, -0.9531522136), (-0.3810571507, 0), (-3.5605162848, 0.9531522136), (-6.7399754189, 1.9063044273), (-6.7399754189, 0)],
                knots=[0, 0, 0, 2.0943951024, 2.0943951024, 4.1887902048, 4.1887902048, 6.2831853072, 6.2831853072, 6.2831853072], degree=2, weights=[1, 0.5, 1, 0.5, 1, 0.5, 1]))
        make_face()
        with BuildLine():
            add(Edge.make_bspline(
                [(6.7399754189, 0), (6.7399754189, 1.9063044273), (3.5605162848, 0.9531522136), (0.3810571507, 0), (3.5605162848, -0.9531522136), (6.7399754189, -1.9063044273), (6.7399754189, 0)],
                knots=[0, 0, 0, 2.0943951024, 2.0943951024, 4.1887902048, 4.1887902048, 6.2831853072, 6.2831853072, 6.2831853072], degree=2, weights=[1, 0.5, 1, 0.5, 1, 0.5, 1]))
        make_face()
    extrude(amount=F3_DEPTH, mode=Mode.SUBTRACT)

    # F6 (on Front) → F7 (cut)
    with BuildSketch(Plane.XZ):
        with Locations((0, 39.5874120295)):
            Circle(F6_R)
    extrude(amount=F7_DEPTH, mode=Mode.SUBTRACT)


with BuildPart() as f5:
    # F4 (on face) → F5 (new body)
    with BuildSketch(Plane(origin=(0, 0, 0), x_dir=(-1, 0, 0), z_dir=(0, 1, 0))):
        with BuildLine():
            add(Edge.make_bspline(
                [(-13.5356802493, 13.6642474681), (-10.5150010112, 13.6642474681), (-12.0253406303, 21.7521889135), (-13.5356802493, 29.8401303589), (-15.0460198684, 21.7521889135), (-16.5563594875, 13.6642474681), (-13.5356802493, 13.6642474681)],
                knots=[0, 0, 0, 2.0943951024, 2.0943951024, 4.1887902048, 4.1887902048, 6.2831853072, 6.2831853072, 6.2831853072], degree=2, weights=[1, 0.5, 1, 0.5, 1, 0.5, 1]))
        make_face()
    extrude(amount=-F5_DEPTH)


with BuildPart() as f5b:
    # F4 (on face) → F5, piece 2 (new body)
    with BuildSketch(Plane(origin=(0, 0, 0), x_dir=(-1, 0, 0), z_dir=(0, 1, 0))):
        with BuildLine():
            add(Edge.make_bspline(
                [(13.5356802493, 13.6642474681), (16.5563594875, 13.6642474681), (15.0460198684, 21.7521889135), (13.5356802493, 29.8401303589), (12.0253406303, 21.7521889135), (10.5150010112, 13.6642474681), (13.5356802493, 13.6642474681)],
                knots=[0, 0, 0, 2.0943951024, 2.0943951024, 4.1887902048, 4.1887902048, 6.2831853072, 6.2831853072, 6.2831853072], degree=2, weights=[1, 0.5, 1, 0.5, 1, 0.5, 1]))
        make_face()
    extrude(amount=-F5_DEPTH)


solid = Compound([f1.part, f5.part, f5b.part])
